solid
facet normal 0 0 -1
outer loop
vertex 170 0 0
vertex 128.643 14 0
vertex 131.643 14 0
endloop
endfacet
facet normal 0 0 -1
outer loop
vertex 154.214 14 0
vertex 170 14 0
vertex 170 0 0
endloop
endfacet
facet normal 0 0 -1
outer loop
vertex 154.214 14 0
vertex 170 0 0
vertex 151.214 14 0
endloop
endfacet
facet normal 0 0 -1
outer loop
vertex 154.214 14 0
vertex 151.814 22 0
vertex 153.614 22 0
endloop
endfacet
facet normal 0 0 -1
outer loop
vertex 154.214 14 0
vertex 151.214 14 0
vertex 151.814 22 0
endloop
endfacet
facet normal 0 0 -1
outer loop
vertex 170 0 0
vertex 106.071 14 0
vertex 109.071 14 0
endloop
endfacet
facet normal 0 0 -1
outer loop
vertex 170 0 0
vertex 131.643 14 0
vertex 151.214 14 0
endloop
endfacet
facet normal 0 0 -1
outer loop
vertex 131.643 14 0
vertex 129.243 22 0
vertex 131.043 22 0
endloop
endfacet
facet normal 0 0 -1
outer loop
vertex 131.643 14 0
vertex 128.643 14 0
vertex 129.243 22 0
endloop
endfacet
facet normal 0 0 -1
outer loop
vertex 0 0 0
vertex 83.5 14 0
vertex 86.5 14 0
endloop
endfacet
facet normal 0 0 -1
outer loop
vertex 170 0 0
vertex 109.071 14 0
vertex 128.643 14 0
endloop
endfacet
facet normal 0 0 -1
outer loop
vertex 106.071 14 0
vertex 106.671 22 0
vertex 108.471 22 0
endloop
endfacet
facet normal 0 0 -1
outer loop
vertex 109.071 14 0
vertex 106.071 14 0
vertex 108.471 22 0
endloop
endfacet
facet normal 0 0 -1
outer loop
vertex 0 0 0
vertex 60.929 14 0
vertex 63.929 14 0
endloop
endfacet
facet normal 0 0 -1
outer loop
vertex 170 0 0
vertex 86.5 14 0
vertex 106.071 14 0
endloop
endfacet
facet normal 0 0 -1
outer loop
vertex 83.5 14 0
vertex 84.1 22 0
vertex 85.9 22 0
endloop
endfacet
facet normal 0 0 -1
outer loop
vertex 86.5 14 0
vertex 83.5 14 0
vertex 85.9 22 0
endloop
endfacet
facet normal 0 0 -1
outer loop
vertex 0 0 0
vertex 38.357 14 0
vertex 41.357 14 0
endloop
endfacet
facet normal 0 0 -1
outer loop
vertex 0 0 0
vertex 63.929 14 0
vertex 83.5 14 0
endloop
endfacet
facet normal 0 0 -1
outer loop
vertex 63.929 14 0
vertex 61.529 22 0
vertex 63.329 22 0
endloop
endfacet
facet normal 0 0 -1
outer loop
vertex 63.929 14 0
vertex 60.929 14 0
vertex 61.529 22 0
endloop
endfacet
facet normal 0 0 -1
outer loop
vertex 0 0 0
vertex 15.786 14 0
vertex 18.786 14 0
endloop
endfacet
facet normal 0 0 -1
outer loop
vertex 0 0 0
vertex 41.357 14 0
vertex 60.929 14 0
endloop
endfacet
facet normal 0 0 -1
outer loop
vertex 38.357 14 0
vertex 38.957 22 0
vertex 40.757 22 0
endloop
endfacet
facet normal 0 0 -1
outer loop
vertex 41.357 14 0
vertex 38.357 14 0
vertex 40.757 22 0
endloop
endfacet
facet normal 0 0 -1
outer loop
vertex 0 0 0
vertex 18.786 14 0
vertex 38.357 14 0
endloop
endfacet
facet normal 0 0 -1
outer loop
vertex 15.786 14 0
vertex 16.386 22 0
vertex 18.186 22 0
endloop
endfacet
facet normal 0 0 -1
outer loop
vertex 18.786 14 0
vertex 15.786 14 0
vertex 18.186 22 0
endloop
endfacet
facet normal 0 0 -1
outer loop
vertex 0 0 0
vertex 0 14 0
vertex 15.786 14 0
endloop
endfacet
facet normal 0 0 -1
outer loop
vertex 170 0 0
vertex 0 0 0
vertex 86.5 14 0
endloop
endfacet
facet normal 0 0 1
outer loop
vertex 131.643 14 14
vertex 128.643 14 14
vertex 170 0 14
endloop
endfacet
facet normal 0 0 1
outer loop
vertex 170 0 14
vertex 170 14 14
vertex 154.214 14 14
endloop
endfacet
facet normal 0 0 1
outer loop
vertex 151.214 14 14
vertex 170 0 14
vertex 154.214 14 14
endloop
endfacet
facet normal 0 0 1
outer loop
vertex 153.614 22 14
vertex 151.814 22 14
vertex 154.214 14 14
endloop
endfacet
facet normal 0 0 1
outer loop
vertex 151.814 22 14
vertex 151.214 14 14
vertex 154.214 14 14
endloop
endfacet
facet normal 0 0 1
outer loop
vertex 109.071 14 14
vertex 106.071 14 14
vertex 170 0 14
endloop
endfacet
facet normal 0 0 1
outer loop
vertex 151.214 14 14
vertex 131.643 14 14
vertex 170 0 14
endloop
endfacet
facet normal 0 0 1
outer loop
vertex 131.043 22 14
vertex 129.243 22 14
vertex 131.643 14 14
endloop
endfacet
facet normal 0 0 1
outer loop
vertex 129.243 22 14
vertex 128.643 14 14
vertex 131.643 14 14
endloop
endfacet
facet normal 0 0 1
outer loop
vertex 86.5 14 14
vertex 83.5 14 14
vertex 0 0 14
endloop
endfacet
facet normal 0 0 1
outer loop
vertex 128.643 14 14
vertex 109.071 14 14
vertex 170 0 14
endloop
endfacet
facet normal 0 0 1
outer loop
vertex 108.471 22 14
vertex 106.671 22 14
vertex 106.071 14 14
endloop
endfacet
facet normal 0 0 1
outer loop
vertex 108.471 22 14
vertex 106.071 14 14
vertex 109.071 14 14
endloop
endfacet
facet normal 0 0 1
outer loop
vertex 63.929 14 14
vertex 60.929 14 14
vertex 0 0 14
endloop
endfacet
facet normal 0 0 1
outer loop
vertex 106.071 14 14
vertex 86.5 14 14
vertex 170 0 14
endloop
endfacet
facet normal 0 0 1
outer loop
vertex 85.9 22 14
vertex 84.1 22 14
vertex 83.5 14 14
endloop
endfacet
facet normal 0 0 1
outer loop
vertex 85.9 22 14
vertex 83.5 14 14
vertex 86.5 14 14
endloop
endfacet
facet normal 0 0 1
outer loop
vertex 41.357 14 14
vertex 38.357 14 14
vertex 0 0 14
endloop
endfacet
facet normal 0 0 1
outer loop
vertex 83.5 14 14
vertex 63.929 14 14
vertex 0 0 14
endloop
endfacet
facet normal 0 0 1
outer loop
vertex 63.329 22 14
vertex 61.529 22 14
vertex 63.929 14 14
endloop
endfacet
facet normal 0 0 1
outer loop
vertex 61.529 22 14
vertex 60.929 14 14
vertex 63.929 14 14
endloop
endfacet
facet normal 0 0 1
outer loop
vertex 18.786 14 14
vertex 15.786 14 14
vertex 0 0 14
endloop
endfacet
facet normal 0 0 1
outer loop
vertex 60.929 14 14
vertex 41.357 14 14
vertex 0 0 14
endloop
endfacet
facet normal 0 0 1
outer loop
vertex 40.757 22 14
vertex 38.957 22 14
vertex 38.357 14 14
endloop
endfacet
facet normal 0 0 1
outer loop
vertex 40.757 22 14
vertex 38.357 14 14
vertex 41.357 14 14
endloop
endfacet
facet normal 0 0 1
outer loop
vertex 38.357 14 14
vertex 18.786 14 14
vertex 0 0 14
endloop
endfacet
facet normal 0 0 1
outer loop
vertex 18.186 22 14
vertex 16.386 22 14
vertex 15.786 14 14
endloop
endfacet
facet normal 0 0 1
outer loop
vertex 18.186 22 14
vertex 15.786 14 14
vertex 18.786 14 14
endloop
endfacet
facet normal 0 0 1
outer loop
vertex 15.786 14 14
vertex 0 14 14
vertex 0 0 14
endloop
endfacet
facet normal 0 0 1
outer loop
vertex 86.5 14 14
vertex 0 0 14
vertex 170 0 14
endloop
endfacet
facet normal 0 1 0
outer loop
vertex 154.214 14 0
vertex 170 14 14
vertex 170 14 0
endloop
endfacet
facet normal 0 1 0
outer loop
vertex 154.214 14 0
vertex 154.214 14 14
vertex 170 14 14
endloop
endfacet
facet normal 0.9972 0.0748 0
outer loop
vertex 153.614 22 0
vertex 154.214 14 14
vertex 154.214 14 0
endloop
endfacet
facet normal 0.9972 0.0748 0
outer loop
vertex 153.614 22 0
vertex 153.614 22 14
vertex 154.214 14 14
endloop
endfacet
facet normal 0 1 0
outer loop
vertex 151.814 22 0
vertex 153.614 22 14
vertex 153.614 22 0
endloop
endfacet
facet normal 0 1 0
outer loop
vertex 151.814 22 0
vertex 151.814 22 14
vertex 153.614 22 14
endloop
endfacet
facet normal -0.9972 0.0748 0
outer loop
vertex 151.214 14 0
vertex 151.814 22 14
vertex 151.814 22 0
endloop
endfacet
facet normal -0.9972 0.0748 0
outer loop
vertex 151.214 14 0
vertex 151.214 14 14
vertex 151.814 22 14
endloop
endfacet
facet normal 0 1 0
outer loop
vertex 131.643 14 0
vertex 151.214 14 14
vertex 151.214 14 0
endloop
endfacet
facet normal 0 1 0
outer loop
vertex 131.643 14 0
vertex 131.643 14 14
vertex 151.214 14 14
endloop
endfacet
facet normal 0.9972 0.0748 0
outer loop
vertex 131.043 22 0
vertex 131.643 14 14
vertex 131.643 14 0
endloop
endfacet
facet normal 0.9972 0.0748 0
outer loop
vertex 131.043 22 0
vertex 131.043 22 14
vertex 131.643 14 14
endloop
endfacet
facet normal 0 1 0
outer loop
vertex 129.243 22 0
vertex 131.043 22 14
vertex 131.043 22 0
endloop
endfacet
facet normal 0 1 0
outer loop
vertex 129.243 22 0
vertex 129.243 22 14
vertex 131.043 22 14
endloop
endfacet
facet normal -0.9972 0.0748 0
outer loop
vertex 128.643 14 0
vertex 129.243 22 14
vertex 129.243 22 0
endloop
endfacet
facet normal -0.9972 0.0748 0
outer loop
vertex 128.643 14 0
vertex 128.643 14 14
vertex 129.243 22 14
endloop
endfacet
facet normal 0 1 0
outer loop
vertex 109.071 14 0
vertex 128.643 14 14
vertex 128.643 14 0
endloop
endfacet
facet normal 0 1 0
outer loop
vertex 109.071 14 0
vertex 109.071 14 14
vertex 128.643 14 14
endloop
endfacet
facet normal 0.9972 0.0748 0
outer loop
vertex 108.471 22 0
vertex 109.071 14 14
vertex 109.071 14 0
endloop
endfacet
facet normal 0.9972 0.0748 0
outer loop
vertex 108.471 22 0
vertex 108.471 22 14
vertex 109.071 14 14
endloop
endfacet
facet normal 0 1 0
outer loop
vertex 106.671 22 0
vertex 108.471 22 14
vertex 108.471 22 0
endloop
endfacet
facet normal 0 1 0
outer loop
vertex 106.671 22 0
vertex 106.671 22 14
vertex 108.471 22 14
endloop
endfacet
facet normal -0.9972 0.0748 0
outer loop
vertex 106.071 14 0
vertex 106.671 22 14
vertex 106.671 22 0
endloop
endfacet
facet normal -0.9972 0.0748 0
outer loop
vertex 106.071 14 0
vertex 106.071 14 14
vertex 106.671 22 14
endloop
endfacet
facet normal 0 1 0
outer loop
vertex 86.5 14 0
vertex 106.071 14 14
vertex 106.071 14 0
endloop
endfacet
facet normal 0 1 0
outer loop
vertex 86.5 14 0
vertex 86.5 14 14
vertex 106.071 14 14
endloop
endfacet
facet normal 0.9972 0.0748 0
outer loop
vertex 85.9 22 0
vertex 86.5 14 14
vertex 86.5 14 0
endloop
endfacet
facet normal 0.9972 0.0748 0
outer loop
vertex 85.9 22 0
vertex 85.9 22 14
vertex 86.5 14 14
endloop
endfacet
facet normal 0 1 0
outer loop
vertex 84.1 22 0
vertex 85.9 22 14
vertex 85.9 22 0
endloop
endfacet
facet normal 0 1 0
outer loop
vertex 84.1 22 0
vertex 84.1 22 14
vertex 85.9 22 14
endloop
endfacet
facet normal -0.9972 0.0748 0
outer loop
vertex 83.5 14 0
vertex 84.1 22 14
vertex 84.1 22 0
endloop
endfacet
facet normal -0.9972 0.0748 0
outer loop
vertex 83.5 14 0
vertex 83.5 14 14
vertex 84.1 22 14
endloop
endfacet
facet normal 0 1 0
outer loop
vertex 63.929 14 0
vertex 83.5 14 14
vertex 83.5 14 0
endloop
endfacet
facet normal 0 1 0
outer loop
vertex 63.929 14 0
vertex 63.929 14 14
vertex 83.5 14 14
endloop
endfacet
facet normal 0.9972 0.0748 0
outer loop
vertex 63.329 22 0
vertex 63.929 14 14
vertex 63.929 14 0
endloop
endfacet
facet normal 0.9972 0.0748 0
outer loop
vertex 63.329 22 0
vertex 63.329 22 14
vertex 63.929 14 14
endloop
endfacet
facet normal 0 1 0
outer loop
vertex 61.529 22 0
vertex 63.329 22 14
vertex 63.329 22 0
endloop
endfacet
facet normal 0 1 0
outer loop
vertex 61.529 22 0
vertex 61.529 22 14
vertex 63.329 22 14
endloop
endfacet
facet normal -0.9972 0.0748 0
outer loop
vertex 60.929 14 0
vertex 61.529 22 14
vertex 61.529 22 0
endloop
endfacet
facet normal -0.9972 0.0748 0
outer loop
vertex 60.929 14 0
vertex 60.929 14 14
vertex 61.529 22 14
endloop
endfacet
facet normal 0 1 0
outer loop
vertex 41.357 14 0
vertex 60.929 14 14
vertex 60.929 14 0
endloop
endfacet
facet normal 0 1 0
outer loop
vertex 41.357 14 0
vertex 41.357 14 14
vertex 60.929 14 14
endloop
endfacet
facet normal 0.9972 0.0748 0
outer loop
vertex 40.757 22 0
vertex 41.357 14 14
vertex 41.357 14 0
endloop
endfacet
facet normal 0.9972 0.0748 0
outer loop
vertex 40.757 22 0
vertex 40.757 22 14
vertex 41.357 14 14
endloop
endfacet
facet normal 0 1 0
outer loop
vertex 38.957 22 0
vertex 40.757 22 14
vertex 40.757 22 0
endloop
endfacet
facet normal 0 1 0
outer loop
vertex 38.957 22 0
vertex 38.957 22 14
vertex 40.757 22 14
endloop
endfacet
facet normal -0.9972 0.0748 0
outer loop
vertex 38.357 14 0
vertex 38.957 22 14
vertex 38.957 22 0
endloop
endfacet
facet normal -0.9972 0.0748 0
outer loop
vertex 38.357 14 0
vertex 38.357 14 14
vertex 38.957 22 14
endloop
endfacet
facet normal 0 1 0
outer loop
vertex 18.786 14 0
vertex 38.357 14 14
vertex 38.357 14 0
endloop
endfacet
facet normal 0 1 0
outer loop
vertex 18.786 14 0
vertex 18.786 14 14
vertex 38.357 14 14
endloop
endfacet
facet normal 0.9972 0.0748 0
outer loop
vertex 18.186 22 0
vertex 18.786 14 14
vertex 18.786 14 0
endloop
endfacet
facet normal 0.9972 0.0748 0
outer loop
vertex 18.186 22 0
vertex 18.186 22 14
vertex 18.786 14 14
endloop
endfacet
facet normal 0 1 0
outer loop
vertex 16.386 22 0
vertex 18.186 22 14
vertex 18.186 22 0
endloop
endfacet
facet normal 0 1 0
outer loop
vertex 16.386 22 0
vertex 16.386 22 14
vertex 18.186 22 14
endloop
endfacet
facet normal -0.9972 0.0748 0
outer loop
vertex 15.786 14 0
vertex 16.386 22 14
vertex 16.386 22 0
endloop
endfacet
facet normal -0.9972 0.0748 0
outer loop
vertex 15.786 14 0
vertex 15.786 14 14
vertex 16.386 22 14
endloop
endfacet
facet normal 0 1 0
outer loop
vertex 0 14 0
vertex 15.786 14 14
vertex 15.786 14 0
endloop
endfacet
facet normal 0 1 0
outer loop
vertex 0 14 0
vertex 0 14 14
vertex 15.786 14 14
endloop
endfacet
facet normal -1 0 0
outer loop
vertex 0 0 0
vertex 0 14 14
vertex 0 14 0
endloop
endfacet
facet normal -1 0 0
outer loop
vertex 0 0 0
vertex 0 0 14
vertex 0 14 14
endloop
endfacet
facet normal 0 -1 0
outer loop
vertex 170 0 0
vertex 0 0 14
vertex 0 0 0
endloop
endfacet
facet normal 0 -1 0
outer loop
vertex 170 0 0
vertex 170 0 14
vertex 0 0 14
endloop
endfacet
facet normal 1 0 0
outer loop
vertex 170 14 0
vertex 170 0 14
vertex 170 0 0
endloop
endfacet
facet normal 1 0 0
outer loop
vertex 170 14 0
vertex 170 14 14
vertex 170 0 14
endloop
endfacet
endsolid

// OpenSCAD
$fn = 32;

// ----------------------------------------------------------------------
// Gear rack: 7 teeth on a 170 mm bar, pitch 22.57 mm
// ----------------------------------------------------------------------

// --- parameters (mm) ---
profile_height = 14;      // extrusion height
profile_points = 32;      // points of the closed outline

profile = [[0, 0], [170, 0], [170, 14], [154.214, 14], [153.614, 22], [151.814, 22], [151.214, 14], [131.643, 14], [131.043, 22], [129.243, 22], [128.643, 14], [109.071, 14], [108.471, 22], [106.671, 22], [106.071, 14], [86.5, 14], [85.9, 22], [84.1, 22], [83.5, 14], [63.929, 14], [63.329, 22], [61.529, 22], [60.929, 14], [41.357, 14], [40.757, 22], [38.957, 22], [38.357, 14], [18.786, 14], [18.186, 22], [16.386, 22], [15.786, 14], [0, 14]];  // single closed polygon, 32 points, counter clockwise

// --- the one profile operation ---
linear_extrude(height = profile_height) polygon(points = profile);
